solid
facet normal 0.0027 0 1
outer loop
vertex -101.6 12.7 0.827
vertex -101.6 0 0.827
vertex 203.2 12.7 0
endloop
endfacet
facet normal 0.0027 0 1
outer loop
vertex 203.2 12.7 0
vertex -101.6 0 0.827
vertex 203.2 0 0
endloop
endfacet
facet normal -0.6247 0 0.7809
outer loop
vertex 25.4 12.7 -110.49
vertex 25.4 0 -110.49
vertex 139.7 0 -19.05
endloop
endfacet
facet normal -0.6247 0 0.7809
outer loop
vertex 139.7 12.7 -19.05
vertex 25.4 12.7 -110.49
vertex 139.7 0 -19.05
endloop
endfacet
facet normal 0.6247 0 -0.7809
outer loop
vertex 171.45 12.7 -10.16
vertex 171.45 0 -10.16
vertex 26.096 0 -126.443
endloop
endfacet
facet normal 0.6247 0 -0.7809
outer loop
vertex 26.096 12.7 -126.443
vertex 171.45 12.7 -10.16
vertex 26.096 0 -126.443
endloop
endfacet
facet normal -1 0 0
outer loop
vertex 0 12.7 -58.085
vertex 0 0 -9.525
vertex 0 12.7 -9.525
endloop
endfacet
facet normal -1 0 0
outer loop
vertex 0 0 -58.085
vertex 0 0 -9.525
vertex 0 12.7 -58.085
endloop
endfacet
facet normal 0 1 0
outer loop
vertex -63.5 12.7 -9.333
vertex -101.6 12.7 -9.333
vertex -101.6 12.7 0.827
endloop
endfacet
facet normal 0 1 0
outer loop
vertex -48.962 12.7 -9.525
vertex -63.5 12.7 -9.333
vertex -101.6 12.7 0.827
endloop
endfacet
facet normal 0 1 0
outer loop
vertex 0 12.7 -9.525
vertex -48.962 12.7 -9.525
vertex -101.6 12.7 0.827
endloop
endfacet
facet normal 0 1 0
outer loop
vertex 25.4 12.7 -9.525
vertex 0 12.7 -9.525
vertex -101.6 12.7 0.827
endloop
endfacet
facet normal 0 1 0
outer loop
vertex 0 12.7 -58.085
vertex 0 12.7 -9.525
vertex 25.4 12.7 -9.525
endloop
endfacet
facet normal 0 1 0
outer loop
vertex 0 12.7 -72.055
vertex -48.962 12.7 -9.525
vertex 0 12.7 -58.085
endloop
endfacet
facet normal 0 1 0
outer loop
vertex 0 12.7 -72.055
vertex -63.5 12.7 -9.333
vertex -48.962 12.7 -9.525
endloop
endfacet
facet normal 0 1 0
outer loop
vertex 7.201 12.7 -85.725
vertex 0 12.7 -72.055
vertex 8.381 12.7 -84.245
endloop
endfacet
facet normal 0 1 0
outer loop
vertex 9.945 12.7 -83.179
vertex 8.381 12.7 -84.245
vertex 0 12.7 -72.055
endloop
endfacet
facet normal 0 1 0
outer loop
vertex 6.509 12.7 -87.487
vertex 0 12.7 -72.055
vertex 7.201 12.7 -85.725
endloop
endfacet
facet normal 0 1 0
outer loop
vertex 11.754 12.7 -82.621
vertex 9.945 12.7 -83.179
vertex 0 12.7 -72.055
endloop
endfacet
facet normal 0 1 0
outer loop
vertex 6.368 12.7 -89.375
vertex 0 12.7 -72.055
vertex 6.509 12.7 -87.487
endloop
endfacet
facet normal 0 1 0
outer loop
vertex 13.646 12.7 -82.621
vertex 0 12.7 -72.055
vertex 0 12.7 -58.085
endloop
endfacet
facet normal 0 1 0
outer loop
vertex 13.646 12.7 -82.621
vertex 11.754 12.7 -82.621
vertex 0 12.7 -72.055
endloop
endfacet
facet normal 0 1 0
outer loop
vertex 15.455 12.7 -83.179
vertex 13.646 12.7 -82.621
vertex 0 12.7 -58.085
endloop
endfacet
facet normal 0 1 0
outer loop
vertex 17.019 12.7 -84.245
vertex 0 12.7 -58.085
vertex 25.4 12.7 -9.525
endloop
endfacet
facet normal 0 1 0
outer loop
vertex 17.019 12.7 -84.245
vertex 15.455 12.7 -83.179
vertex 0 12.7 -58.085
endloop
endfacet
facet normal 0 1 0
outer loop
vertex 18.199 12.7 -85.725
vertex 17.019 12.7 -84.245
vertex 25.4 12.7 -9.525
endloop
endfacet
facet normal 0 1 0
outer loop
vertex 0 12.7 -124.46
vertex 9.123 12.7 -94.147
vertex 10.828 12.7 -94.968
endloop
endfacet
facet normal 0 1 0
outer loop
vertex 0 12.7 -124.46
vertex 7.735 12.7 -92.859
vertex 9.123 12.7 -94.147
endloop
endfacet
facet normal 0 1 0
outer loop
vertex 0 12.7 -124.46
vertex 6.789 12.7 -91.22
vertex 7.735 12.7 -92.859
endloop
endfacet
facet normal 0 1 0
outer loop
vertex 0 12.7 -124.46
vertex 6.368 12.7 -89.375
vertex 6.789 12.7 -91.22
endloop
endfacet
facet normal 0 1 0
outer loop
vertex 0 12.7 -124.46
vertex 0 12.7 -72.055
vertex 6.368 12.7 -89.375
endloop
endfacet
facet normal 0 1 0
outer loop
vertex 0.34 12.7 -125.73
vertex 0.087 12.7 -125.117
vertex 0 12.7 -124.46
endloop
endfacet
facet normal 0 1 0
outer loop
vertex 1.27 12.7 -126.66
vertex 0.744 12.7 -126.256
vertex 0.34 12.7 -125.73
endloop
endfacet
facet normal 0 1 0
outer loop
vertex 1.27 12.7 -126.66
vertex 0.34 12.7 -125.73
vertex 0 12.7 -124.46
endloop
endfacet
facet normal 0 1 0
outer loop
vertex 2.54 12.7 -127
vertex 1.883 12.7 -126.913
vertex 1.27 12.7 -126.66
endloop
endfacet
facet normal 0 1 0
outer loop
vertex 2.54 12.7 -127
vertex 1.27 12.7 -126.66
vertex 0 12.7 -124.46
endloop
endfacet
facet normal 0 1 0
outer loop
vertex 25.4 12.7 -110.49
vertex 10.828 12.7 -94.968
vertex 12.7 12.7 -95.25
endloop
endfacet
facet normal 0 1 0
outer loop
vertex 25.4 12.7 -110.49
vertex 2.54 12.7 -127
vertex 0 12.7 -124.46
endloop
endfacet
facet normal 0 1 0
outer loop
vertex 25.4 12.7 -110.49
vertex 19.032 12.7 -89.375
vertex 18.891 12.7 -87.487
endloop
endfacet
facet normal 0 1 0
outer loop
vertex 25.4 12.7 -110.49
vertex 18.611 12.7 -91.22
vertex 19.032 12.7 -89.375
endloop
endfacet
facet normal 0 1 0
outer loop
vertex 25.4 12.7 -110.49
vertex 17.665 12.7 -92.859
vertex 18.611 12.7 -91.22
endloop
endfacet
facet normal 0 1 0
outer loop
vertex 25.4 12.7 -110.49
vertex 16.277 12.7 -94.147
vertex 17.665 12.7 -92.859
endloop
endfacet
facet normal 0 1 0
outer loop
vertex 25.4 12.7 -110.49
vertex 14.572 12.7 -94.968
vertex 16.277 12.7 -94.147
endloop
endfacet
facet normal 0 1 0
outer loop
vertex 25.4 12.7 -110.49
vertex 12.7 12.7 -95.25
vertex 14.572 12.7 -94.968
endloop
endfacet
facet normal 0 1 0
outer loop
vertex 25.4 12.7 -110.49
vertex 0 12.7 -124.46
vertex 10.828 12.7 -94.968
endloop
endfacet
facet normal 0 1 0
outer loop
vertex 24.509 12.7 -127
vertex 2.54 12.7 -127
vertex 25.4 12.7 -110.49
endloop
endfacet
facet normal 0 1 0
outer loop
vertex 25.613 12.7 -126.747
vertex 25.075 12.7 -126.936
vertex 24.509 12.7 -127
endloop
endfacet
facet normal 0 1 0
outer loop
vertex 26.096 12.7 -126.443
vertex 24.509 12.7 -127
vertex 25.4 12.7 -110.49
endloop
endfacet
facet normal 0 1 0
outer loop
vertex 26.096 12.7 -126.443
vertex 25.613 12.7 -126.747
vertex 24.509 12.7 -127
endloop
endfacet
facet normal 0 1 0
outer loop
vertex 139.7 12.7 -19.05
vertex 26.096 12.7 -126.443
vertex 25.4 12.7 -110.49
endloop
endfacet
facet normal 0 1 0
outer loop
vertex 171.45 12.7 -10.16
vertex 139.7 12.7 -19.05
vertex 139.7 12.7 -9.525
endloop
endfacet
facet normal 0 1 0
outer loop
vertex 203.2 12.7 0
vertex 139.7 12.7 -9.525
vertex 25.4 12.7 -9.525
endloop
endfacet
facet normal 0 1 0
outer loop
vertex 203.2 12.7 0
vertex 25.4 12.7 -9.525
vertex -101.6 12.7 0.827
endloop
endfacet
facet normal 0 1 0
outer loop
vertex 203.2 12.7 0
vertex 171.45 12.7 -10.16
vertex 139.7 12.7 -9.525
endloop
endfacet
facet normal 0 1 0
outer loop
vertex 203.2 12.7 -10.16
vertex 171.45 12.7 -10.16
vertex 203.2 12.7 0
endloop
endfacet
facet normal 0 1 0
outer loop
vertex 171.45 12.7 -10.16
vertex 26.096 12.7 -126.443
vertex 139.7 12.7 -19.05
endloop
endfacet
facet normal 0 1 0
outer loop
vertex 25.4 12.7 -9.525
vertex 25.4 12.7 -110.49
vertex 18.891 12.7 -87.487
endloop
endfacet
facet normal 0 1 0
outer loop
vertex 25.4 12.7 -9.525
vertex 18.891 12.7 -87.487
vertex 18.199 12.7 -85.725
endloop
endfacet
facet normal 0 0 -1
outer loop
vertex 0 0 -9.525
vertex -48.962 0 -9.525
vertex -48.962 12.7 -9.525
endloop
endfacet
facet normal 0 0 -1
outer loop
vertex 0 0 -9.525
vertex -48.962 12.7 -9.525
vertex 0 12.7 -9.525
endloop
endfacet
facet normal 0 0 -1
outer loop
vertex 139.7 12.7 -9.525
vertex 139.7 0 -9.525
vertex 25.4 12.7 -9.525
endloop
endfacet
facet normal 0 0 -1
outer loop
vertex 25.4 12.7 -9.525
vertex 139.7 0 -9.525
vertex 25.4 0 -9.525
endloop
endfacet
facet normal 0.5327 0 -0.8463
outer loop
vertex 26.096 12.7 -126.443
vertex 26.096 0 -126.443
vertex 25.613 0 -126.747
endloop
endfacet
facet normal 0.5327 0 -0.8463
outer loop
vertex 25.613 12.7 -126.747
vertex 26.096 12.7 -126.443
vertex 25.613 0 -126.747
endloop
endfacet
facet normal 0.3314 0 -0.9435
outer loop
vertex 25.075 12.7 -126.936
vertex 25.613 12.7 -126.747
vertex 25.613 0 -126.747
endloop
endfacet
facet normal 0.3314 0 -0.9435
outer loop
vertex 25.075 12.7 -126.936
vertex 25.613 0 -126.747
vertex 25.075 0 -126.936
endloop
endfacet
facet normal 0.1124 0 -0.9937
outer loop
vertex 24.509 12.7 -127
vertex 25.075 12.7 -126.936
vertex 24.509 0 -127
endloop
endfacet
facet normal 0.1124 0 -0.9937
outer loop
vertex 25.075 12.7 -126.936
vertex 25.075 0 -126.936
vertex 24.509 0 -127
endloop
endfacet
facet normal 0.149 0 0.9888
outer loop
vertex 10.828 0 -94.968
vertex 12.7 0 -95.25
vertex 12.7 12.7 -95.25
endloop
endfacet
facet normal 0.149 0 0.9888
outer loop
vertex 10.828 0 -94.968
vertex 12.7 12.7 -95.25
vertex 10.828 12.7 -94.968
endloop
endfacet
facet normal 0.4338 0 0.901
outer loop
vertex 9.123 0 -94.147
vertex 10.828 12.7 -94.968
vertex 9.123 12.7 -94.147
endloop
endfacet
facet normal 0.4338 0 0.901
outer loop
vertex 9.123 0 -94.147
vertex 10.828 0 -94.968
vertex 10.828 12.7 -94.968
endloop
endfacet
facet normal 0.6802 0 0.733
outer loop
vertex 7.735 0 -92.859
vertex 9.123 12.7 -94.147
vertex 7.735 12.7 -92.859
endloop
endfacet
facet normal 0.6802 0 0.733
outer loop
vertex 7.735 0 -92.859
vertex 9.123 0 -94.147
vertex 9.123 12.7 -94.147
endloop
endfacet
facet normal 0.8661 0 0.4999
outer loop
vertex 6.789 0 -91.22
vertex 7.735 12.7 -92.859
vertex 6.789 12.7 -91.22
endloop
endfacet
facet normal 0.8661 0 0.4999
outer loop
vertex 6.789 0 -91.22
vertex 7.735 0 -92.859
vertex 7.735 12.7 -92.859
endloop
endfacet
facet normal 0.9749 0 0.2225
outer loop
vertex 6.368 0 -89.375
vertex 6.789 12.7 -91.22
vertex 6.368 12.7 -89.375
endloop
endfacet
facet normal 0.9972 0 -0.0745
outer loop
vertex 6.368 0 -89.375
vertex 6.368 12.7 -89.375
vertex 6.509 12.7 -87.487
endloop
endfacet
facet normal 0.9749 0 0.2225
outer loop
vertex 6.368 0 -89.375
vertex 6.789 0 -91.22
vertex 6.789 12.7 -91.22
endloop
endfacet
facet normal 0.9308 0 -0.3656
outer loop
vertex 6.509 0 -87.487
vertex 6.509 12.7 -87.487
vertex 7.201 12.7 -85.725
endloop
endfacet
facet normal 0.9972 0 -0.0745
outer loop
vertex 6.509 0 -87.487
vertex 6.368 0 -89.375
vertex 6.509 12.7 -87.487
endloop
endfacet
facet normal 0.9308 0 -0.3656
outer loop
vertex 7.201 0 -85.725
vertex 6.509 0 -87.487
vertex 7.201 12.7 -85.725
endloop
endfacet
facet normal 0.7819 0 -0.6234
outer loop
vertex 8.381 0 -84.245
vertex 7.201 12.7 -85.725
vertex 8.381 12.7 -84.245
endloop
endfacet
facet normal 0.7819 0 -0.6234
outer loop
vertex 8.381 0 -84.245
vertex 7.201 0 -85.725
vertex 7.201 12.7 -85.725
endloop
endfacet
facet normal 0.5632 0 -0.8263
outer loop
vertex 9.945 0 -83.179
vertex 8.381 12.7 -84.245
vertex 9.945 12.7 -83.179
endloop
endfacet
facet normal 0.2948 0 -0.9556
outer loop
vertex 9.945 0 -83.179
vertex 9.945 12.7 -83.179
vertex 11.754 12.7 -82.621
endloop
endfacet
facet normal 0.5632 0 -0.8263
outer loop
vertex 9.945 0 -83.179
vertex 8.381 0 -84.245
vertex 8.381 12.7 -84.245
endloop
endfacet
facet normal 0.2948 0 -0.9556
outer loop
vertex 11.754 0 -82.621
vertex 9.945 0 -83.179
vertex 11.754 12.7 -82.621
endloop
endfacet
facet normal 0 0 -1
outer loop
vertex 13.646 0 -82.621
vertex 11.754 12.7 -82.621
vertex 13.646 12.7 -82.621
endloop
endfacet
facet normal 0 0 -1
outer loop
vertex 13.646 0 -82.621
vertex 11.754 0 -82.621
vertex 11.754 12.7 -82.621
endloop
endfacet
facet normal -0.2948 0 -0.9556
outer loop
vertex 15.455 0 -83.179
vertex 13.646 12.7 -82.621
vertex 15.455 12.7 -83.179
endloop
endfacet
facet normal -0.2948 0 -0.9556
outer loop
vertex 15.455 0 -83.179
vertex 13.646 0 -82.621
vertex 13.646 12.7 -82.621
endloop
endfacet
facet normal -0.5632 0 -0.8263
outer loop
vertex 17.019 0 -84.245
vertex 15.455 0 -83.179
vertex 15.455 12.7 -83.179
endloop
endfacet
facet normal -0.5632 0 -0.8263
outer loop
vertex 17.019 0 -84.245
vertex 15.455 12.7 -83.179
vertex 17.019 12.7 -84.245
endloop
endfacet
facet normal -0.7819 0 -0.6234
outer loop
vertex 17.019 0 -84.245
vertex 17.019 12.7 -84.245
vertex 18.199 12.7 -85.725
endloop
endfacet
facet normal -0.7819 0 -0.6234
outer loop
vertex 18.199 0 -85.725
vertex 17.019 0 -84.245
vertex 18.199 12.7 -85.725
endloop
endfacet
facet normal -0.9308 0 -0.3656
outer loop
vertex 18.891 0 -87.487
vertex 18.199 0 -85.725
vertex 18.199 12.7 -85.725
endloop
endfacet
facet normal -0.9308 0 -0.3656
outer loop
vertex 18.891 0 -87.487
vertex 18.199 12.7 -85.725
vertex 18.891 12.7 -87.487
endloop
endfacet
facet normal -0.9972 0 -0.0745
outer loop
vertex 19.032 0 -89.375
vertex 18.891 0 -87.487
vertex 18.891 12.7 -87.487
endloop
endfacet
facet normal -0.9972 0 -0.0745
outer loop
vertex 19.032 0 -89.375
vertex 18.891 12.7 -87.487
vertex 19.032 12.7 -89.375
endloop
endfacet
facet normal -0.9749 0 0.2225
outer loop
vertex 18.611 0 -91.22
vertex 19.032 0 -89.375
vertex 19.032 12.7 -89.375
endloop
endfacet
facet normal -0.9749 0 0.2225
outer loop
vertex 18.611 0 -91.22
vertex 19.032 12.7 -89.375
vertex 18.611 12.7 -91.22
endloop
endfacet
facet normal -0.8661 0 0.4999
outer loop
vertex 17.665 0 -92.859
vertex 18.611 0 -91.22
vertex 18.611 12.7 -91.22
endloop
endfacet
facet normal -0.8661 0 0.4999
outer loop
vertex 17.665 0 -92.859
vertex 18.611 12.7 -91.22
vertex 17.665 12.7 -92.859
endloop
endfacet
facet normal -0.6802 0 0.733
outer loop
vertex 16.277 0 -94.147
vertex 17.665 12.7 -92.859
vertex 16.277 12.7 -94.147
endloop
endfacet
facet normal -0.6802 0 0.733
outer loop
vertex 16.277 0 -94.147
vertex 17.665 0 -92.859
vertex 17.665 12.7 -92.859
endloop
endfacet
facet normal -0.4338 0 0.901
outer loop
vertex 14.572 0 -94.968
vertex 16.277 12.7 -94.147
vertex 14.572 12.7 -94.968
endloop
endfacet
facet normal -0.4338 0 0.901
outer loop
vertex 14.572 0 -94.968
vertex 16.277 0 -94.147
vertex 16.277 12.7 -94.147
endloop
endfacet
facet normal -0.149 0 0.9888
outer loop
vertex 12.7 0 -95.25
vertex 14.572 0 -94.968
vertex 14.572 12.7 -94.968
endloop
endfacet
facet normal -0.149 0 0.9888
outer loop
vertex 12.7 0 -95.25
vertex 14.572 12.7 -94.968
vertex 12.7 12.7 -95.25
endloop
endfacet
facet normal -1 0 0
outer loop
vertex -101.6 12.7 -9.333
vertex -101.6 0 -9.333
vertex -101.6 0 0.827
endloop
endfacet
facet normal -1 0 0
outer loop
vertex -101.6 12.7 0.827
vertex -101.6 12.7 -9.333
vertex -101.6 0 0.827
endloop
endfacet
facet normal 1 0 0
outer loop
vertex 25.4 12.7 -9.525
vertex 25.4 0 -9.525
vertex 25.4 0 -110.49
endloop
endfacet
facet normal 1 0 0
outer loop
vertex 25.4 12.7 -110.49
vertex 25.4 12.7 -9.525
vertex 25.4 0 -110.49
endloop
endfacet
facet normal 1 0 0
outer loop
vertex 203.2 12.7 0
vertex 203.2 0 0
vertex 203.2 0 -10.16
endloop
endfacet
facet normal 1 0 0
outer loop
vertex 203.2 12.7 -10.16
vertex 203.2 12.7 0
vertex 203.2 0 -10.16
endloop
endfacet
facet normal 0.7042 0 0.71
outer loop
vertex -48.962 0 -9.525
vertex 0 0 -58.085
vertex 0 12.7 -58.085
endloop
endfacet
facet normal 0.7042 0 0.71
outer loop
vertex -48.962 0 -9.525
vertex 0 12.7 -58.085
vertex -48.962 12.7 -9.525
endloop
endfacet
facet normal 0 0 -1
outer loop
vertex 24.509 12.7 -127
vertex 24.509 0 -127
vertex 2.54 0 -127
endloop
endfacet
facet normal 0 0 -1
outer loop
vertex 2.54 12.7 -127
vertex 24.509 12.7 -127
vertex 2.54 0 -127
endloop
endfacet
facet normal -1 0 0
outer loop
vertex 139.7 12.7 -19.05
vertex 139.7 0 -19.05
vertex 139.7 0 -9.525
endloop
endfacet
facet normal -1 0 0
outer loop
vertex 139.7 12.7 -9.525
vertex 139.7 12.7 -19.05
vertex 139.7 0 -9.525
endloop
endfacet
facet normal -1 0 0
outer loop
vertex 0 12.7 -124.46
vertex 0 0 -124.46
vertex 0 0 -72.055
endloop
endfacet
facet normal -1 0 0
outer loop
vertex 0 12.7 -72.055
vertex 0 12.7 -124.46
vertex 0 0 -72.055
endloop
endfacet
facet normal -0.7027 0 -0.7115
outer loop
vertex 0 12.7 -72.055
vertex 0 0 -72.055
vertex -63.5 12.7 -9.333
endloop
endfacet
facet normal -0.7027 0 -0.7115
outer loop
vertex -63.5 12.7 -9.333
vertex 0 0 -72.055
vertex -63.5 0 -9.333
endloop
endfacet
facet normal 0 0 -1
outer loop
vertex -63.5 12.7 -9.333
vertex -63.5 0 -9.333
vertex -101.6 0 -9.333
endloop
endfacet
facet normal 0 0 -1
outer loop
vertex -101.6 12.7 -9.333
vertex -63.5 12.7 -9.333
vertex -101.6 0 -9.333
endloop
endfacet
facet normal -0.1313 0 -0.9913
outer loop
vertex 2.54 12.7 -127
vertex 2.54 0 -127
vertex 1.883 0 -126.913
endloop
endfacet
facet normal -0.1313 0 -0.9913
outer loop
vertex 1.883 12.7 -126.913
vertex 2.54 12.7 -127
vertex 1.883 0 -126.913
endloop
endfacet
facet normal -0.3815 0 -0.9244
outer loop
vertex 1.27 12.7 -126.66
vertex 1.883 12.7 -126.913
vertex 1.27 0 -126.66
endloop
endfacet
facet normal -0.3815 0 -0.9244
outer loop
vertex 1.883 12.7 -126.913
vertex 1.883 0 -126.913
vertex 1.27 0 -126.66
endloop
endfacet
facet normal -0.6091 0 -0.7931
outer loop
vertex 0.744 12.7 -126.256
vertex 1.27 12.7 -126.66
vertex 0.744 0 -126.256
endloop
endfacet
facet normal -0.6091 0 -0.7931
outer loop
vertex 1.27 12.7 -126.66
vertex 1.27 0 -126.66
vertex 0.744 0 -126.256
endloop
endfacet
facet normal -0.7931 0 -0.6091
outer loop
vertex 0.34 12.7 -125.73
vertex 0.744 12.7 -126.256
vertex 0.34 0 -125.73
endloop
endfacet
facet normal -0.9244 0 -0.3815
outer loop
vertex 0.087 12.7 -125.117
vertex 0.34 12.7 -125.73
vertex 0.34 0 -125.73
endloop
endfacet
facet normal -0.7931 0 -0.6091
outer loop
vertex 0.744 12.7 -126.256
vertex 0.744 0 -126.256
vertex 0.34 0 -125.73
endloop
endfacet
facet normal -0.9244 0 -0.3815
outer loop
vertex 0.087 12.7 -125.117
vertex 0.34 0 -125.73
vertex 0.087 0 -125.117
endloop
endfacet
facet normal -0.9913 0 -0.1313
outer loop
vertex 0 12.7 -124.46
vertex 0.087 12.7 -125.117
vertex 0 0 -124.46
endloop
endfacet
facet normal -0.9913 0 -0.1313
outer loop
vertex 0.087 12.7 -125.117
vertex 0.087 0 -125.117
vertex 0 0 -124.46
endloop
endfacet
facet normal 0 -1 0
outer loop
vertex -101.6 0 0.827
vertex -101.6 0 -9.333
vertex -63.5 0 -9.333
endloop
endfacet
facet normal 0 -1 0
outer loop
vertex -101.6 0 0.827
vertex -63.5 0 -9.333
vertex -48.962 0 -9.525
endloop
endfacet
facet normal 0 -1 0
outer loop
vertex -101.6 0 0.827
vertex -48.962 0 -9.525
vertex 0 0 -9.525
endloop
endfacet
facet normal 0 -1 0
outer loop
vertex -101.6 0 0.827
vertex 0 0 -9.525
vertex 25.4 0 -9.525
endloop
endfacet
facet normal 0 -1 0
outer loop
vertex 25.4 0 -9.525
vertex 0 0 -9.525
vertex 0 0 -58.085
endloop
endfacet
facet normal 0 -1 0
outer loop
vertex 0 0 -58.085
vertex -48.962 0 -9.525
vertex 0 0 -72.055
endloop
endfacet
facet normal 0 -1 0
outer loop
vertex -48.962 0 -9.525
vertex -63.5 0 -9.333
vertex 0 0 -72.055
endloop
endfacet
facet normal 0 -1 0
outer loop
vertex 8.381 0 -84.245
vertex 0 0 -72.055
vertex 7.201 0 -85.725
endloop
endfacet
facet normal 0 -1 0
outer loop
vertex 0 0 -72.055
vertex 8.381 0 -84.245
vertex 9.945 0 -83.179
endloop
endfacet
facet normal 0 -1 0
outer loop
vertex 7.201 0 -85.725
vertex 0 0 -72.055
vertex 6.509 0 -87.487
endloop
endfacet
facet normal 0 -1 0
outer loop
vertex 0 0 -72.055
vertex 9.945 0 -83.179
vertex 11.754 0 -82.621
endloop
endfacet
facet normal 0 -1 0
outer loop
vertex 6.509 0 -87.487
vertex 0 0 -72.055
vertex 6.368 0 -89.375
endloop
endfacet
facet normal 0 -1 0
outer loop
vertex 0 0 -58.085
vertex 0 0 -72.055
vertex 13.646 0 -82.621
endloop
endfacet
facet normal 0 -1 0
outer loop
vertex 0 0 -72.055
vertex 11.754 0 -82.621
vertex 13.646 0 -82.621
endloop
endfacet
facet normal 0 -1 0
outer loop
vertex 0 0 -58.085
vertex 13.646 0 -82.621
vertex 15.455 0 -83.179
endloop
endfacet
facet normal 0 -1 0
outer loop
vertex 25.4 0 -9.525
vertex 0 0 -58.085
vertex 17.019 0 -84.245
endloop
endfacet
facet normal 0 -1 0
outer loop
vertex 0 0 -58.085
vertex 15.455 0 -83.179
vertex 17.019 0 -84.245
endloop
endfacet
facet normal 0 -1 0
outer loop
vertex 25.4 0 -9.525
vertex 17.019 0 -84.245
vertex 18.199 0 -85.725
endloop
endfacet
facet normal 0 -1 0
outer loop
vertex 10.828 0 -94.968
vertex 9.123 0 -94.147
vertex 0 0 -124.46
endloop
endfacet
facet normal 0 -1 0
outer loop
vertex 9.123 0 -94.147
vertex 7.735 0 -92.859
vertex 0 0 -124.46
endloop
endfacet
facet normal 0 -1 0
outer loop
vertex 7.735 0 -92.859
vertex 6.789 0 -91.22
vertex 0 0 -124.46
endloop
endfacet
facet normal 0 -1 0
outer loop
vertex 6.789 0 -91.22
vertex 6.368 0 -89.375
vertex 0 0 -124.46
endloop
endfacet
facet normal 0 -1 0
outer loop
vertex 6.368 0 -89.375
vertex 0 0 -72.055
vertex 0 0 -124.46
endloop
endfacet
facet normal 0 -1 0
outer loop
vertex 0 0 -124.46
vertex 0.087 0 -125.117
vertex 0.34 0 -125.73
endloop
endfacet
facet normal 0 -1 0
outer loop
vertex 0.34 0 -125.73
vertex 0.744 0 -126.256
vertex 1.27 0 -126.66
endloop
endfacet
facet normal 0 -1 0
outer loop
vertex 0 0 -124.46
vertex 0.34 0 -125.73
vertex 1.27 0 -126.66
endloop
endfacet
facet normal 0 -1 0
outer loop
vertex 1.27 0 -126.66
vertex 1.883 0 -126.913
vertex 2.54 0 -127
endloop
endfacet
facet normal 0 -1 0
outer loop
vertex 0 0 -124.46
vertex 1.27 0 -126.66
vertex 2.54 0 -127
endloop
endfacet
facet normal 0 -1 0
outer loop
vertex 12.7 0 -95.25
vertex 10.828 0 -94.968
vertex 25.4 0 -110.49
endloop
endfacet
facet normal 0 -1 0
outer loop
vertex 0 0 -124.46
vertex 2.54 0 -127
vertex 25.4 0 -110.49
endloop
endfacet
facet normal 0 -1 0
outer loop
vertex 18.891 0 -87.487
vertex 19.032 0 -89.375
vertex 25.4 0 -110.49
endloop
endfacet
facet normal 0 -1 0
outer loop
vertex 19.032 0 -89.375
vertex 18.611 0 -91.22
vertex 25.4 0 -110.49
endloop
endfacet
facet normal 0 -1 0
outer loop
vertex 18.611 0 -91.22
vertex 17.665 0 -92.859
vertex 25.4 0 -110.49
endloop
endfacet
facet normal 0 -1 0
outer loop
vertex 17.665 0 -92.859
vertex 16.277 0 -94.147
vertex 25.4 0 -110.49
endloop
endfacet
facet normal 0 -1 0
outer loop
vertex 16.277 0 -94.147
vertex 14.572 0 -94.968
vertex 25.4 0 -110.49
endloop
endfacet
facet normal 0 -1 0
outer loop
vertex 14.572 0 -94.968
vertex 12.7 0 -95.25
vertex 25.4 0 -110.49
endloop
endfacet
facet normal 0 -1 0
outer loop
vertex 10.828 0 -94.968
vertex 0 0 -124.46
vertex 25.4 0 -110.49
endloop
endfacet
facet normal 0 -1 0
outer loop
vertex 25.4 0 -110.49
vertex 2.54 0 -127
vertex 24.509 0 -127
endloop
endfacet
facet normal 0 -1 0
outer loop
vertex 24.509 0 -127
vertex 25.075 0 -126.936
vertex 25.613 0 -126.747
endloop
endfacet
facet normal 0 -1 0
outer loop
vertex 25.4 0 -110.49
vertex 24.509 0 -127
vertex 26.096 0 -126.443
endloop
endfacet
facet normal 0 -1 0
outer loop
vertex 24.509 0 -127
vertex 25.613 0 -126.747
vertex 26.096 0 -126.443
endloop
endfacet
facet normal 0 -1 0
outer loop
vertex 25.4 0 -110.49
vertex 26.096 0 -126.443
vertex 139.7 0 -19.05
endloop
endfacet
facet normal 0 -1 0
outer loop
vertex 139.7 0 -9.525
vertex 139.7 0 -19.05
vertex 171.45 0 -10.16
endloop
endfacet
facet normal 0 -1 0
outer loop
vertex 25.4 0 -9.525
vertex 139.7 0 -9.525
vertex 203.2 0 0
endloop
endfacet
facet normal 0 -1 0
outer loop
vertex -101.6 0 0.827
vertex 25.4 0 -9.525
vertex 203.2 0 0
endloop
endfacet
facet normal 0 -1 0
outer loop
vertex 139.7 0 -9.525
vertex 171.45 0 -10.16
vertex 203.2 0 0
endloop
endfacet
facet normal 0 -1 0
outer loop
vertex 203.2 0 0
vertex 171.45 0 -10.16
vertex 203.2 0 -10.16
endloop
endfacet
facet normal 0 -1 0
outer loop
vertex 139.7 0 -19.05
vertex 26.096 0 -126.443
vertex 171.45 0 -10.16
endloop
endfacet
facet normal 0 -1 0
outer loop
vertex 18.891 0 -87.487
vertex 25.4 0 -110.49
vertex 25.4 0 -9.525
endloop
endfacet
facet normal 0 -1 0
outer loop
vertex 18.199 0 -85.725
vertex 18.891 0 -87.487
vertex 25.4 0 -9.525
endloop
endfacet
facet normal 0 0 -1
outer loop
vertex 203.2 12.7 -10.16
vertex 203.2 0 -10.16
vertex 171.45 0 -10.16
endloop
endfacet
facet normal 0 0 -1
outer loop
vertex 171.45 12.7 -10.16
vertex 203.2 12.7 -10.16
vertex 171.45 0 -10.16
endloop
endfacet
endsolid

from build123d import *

# Parameters (mm, degrees)
SKETCH1_R           = 6.35
BOSS_EXTRUDE1_DEPTH = 12.7


with BuildPart() as part:
    # Sketch1 → Boss-Extrude1 (new body)
    with BuildSketch(Plane(origin=(0, 0, 0), x_dir=(1, 0, 0), z_dir=(0, 1, 0))):
        with BuildLine():
            Line((171.45, 10.16), (26.09574153, 126.443406776))
            ThreePointArc((26.09574153, 126.443406776), (25.34977374, 126.856815931), (24.509016109, 127))
            Line((24.509016109, 127), (2.54, 127))
            ThreePointArc((2.54, 127), (0.743948776, 126.256051224), (0, 124.46))
            Line((0, 124.46), (0, 72.055027479))
            Line((0, 72.055027479), (-63.5, 9.332908944))
            Line((-63.5, 9.332908944), (-101.6, 9.332908944))
            Line((-101.6, 9.332908944), (-101.6, -0.827091056))
            Line((-101.6, -0.827091056), (203.2, 0))
            Line((203.2, 0), (203.2, 10.16))
            Line((203.2, 10.16), (171.45, 10.16))
        make_face()
        with Locations(Location((12.7, 88.9, 0), (0, 0, 90))):
            Circle(SKETCH1_R, mode=Mode.SUBTRACT)
        Polygon((0, 9.525), (0, 58.085027479), (-48.962001116, 9.525), align=None, mode=Mode.SUBTRACT)
        Polygon((25.4, 9.525), (25.4, 110.49), (139.7, 19.05), (139.7, 9.525), align=None, mode=Mode.SUBTRACT)
    extrude(amount=BOSS_EXTRUDE1_DEPTH)


solid = part.part
